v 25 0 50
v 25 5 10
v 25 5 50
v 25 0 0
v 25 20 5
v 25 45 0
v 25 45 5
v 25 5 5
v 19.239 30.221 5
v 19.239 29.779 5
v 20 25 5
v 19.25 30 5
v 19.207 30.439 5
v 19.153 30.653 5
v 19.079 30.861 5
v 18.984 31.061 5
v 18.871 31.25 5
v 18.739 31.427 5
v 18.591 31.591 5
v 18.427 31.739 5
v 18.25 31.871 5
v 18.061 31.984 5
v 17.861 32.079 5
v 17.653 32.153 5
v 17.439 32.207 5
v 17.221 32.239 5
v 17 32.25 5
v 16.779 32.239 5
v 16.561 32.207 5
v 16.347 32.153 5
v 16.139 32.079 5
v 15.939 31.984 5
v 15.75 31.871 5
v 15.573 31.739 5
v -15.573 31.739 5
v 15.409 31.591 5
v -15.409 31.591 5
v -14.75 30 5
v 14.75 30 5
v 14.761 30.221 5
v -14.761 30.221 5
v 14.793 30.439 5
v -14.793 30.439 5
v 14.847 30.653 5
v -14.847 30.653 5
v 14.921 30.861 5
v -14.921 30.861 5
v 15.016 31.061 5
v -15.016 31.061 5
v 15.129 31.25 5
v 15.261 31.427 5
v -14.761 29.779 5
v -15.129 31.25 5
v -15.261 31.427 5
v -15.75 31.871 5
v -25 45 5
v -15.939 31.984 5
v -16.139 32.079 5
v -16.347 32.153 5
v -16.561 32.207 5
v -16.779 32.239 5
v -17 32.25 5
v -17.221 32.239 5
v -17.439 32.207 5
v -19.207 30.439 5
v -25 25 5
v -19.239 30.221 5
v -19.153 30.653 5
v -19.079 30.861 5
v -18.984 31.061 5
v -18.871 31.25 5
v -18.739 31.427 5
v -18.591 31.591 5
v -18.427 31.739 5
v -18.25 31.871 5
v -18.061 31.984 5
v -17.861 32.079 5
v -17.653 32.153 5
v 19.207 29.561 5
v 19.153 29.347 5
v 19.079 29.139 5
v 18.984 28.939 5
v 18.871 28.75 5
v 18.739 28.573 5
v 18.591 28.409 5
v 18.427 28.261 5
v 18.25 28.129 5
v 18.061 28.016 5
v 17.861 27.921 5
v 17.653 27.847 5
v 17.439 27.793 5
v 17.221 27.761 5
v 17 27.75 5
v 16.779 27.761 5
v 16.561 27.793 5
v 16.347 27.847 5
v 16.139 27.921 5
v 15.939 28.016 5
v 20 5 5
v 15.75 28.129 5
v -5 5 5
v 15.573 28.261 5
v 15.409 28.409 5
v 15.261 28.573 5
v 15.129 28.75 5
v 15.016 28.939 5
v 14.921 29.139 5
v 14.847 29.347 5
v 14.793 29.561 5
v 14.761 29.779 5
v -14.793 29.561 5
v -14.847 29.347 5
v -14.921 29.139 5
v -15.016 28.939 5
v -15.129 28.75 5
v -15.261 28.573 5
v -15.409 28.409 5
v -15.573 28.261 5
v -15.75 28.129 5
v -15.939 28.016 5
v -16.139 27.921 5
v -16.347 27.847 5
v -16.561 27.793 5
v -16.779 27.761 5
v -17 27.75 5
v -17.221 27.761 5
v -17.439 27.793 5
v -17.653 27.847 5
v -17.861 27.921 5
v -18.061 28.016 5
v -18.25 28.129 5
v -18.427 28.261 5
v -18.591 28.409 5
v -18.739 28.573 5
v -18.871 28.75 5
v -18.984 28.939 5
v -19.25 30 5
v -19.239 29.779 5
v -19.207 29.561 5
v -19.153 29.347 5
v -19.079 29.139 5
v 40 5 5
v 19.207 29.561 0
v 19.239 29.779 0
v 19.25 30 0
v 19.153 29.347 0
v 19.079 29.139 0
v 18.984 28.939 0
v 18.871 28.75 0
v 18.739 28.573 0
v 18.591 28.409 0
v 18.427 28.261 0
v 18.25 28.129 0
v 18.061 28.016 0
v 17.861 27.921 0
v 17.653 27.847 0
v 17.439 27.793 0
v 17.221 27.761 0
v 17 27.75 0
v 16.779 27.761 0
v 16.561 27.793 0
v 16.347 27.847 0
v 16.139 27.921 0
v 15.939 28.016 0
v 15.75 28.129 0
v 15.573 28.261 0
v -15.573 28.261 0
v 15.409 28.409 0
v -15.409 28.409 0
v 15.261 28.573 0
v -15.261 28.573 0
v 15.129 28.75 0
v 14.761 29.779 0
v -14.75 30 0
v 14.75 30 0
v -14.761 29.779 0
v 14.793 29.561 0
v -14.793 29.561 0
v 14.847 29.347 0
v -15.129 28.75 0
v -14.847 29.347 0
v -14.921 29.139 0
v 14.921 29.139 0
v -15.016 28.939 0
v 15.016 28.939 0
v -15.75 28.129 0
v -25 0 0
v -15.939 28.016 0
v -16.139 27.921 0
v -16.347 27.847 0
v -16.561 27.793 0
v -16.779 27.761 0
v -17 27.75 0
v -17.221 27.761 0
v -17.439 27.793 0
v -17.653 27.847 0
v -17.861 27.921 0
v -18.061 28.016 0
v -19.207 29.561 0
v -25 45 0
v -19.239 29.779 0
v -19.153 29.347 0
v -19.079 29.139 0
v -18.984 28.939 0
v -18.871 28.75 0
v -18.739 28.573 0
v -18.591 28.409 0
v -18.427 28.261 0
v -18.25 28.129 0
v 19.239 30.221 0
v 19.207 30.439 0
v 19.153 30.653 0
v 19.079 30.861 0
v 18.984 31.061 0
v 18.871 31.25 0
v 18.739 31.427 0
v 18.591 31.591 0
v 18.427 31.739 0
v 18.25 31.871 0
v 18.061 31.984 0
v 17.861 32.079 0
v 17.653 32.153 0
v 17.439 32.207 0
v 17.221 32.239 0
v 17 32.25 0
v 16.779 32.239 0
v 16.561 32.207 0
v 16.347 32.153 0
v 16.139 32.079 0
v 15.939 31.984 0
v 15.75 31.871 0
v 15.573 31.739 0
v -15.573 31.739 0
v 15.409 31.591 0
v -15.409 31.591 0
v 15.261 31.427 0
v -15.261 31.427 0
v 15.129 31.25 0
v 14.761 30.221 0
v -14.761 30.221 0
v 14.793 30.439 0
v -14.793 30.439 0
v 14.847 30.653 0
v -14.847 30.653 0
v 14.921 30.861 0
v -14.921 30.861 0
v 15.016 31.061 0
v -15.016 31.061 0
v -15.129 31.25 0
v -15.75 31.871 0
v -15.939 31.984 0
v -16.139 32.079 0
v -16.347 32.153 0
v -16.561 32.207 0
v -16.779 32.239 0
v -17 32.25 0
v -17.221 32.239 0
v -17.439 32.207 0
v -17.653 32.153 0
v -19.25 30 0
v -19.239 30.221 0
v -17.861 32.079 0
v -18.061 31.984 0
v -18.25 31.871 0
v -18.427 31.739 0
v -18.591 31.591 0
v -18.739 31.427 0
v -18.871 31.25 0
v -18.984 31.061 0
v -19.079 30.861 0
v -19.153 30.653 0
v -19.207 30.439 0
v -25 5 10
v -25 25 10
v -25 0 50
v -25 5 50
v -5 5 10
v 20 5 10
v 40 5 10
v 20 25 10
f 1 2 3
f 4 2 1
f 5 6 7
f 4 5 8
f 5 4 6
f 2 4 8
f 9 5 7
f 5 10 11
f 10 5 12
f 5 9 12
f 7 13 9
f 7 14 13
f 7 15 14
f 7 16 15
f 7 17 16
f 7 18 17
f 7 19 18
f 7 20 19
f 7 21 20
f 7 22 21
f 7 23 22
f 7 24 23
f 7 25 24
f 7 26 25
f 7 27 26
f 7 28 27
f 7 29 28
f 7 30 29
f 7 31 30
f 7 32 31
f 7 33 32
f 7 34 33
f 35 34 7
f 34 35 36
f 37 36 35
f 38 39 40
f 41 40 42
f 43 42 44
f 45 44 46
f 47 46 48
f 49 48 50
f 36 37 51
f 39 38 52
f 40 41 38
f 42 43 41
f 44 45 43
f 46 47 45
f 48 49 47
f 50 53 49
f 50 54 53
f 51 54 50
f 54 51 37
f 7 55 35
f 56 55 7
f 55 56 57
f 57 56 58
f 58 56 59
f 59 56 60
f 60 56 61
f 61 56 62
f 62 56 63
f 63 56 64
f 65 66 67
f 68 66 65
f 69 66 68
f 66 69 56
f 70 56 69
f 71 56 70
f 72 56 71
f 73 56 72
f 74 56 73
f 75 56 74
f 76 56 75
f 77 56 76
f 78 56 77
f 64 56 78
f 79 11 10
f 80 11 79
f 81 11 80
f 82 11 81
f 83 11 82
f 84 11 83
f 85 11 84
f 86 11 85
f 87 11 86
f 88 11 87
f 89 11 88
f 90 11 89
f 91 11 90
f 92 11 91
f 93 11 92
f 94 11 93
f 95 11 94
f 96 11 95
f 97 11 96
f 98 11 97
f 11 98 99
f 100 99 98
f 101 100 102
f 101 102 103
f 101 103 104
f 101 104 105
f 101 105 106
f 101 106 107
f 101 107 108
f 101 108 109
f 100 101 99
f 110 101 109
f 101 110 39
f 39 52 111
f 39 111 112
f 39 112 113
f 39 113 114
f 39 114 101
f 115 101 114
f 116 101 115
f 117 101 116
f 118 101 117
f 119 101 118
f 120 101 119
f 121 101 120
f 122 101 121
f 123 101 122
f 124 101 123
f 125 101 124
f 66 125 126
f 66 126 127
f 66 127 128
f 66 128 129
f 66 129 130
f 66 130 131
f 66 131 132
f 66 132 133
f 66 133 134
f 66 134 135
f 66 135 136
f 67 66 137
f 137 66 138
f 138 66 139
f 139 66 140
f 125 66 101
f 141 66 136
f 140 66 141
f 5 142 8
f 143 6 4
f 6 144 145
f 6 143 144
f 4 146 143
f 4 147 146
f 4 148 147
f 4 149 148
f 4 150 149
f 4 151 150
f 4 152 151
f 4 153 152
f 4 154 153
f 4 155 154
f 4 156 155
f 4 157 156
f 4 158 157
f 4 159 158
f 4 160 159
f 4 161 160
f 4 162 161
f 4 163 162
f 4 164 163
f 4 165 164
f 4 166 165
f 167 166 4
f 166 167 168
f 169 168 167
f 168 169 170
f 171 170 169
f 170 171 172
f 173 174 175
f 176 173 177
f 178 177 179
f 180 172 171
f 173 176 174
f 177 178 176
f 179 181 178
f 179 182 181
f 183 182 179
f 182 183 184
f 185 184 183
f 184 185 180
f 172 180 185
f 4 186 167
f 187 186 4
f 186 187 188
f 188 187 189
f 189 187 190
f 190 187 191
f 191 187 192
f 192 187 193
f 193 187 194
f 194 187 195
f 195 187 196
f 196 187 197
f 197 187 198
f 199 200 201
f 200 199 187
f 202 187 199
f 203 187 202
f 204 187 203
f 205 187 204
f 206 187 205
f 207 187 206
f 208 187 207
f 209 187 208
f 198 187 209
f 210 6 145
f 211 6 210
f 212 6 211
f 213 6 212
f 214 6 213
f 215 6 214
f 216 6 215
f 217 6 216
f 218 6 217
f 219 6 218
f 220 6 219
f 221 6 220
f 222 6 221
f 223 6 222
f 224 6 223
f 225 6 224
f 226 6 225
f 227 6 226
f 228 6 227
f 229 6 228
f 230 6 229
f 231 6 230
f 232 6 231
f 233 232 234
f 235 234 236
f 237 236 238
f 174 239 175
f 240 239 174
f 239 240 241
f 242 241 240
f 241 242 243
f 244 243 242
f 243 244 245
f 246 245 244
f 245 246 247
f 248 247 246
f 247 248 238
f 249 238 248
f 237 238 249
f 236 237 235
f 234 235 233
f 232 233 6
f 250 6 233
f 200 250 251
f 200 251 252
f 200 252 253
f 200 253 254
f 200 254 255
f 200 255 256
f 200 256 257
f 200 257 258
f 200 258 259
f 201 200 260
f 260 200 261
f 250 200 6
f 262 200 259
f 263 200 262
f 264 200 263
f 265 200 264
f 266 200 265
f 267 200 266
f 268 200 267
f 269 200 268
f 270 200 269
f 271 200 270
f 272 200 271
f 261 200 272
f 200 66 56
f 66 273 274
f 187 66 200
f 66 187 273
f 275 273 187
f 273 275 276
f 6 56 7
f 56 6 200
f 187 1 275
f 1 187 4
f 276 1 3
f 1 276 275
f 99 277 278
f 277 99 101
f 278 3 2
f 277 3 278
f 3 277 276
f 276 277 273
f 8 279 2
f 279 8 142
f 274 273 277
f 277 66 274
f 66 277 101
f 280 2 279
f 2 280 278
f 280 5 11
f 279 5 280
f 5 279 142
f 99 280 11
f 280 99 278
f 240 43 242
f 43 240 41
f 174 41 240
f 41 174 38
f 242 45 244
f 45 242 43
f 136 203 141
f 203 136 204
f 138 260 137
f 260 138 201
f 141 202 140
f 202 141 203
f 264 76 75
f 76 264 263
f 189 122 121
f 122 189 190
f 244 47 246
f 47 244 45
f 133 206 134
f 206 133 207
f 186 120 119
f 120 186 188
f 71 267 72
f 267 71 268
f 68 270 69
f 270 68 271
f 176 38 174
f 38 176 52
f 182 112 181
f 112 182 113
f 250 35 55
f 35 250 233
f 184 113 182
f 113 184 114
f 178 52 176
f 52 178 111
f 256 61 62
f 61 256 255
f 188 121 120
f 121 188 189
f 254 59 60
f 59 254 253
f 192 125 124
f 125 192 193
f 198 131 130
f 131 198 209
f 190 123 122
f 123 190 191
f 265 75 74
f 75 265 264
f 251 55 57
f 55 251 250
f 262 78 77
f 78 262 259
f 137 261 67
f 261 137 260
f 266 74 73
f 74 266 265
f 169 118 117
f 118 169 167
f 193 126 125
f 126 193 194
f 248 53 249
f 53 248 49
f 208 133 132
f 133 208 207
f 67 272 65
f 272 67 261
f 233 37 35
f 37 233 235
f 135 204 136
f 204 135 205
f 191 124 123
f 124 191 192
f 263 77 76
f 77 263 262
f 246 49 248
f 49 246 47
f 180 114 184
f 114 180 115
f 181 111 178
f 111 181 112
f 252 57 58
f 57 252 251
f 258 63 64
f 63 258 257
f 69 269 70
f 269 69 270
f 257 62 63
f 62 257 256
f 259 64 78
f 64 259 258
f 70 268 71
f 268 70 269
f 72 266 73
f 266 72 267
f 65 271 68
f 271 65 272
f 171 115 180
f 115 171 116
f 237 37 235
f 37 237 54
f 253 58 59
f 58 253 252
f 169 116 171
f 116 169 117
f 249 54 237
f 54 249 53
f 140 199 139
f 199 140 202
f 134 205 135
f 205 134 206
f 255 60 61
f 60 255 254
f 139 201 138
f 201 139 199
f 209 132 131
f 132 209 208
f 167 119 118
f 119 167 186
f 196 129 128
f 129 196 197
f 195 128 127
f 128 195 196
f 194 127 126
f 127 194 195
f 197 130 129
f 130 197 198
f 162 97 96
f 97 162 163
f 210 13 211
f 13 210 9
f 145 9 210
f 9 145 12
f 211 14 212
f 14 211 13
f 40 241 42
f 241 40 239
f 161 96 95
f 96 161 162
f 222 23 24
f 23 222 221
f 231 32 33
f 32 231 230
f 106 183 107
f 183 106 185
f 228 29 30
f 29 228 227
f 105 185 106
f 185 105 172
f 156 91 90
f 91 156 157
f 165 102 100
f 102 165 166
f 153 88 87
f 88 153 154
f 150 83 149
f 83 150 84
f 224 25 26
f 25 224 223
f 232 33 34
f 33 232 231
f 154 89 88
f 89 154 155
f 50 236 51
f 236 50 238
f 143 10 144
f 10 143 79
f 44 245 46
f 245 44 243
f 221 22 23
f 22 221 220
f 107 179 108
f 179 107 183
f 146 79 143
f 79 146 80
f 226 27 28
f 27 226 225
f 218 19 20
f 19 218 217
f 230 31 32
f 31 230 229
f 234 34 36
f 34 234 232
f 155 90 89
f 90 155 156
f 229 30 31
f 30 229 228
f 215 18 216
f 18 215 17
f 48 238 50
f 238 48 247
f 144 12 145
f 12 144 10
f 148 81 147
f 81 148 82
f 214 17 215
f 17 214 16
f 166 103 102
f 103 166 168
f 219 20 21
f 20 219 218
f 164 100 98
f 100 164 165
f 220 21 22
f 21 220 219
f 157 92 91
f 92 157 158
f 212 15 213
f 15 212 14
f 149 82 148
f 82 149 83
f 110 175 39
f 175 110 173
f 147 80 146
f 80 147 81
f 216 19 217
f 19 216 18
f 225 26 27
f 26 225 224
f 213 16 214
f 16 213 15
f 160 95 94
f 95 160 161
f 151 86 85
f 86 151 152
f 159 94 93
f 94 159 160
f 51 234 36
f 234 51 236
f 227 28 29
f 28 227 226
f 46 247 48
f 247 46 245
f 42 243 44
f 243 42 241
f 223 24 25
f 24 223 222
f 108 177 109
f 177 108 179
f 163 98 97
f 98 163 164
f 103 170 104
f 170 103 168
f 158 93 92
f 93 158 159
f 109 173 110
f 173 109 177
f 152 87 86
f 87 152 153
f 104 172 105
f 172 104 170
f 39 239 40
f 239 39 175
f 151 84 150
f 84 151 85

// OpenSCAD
// L-shaped NEMA 17 Mounting Bracket for Syringe Pump
// Print orientation: Base plate on XY plane (z=0), building upward (+Z).

// --- Dimensions ---
// Base Plate
base_x_min = -25;
base_x_max = 25;
base_y_min = 0;
base_y_max = 45;
base_z_min = 0;
base_z_max = 5;

// Vertical Motor Plate
motor_x_min = -25;
motor_x_max = 25;
motor_y_min = 0;
motor_y_max = 5;
motor_z_min = 0;
motor_z_max = 50;

// Gussets
gusset_thickness = 5;
gusset_leg_y = 20;
gusset_leg_z = 20;
gusset_x_start_left = -25;
gusset_x_end_left = -20;
gusset_x_start_right = 20;
gusset_x_end_right = 25;

// Holes - Base Plate (M4)
hole_base_dia = 4.5;
hole_base_pos_1 = [-17, 30];
hole_base_pos_2 = [17, 30];

// Holes - Motor Plate (Centering Boss)
hole_boss_dia = 23;
hole_boss_center = [0, 28]; // x, z

// Holes - Motor Plate (M3 Screws)
hole_screw_dia = 3.4;
screw_pattern_size = 31; // Square pattern side length
screw_pattern_center = [0, 28]; // x, z (same as boss)

// --- Rendering Settings ---
$fn = 64;

// --- Main Assembly ---
difference() {
    union() {
        // 1. Base Plate
        translate([
            (base_x_min + base_x_max) / 2,
            (base_y_min + base_y_max) / 2,
            (base_z_min + base_z_max) / 2
        ])
        cube([
            base_x_max - base_x_min,
            base_y_max - base_y_min,
            base_z_max - base_z_min
        ], center = true);

        // 2. Vertical Motor Plate
        translate([
            (motor_x_min + motor_x_max) / 2,
            (motor_y_min + motor_y_max) / 2,
            (motor_z_min + motor_z_max) / 2
        ])
        cube([
            motor_x_max - motor_x_min,
            motor_y_max - motor_y_min,
            motor_z_max - motor_z_min
        ], center = true);

        // 3. Left Gusset
        // Right triangle in YZ plane, right angle at (y=5, z=5)
        // Legs extend +Y and +Z
        // The gusset is 5mm thick, spanning x from -25 to -20.
        // The triangle vertices in local YZ (origin at corner) are (0,0), (20,0), (0,20).
        // We translate the origin of the linear_extrude to the corner (x=-25, y=5, z=5).
        translate([gusset_x_start_left, 5, 5])
        linear_extrude(height = gusset_thickness, convexity = 10)
        polygon(points = [
            [0, 0], // Right angle corner (local)
            [gusset_leg_y, 0], // Along +Y
            [0, gusset_leg_z]  // Along +Z
        ]);

        // 4. Right Gusset
        // The gusset is 5mm thick, spanning x from 20 to 25.
        // The triangle vertices in local YZ (origin at corner) are (0,0), (20,0), (0,20).
        // We translate the origin of the linear_extrude to the corner (x=20, y=5, z=5).
        translate([gusset_x_start_right, 5, 5])
        linear_extrude(height = gusset_thickness, convexity = 10)
        polygon(points = [
            [0, 0], // Right angle corner (local)
            [gusset_leg_y, 0], // Along +Y
            [0, gusset_leg_z]  // Along +Z
        ]);
    }

    // --- Cuts ---

    // 5. Base Plate Holes (M4)
    // Extend slightly past z=0 and z=5 to ensure clean cut
    translate([hole_base_pos_1[0], hole_base_pos_1[1], -1])
    cylinder(h = base_z_max + 2, r = hole_base_dia / 2, center = false);

    translate([hole_base_pos_2[0], hole_base_pos_2[1], -1])
    cylinder(h = base_z_max + 2, r = hole_base_dia / 2, center = false);

    // 6. Motor Plate Centering Boss Hole (23mm)
    // Cuts along Y axis. Center at x=0, z=28.
    // Extend past y=0 and y=5
    translate([hole_boss_center[0], -1, hole_boss_center[1]])
    rotate([90, 0, 0]) // Rotate cylinder to align with Y axis
    cylinder(h = motor_y_max + 2, r = hole_boss_dia / 2, center = false);

    // 7. Motor Plate M3 Screw Holes (31mm square pattern)
    // Pattern centered on boss hole (x=0, z=28)
    // Square side 31mm -> offset from center is 31/2 = 15.5mm
    screw_offset = screw_pattern_size / 2;
    
    // Four corners of the square pattern
    screw_positions = [
        [screw_pattern_center[0] - screw_offset, screw_pattern_center[1] - screw_offset], // Bottom Left
        [screw_pattern_center[0] + screw_offset, screw_pattern_center[1] - screw_offset], // Bottom Right
        [screw_pattern_center[0] - screw_offset, screw_pattern_center[1] + screw_offset], // Top Left
        [screw_pattern_center[0] + screw_offset, screw_pattern_center[1] + screw_offset]  // Top Right
    ];

    for (pos = screw_positions) {
        // pos[0] is x, pos[1] is z
        translate([pos[0], -1, pos[1]])
        rotate([90, 0, 0]) // Rotate cylinder to align with Y axis
        cylinder(h = motor_y_max + 2, r = hole_screw_dia / 2, center = false);
    }
}
